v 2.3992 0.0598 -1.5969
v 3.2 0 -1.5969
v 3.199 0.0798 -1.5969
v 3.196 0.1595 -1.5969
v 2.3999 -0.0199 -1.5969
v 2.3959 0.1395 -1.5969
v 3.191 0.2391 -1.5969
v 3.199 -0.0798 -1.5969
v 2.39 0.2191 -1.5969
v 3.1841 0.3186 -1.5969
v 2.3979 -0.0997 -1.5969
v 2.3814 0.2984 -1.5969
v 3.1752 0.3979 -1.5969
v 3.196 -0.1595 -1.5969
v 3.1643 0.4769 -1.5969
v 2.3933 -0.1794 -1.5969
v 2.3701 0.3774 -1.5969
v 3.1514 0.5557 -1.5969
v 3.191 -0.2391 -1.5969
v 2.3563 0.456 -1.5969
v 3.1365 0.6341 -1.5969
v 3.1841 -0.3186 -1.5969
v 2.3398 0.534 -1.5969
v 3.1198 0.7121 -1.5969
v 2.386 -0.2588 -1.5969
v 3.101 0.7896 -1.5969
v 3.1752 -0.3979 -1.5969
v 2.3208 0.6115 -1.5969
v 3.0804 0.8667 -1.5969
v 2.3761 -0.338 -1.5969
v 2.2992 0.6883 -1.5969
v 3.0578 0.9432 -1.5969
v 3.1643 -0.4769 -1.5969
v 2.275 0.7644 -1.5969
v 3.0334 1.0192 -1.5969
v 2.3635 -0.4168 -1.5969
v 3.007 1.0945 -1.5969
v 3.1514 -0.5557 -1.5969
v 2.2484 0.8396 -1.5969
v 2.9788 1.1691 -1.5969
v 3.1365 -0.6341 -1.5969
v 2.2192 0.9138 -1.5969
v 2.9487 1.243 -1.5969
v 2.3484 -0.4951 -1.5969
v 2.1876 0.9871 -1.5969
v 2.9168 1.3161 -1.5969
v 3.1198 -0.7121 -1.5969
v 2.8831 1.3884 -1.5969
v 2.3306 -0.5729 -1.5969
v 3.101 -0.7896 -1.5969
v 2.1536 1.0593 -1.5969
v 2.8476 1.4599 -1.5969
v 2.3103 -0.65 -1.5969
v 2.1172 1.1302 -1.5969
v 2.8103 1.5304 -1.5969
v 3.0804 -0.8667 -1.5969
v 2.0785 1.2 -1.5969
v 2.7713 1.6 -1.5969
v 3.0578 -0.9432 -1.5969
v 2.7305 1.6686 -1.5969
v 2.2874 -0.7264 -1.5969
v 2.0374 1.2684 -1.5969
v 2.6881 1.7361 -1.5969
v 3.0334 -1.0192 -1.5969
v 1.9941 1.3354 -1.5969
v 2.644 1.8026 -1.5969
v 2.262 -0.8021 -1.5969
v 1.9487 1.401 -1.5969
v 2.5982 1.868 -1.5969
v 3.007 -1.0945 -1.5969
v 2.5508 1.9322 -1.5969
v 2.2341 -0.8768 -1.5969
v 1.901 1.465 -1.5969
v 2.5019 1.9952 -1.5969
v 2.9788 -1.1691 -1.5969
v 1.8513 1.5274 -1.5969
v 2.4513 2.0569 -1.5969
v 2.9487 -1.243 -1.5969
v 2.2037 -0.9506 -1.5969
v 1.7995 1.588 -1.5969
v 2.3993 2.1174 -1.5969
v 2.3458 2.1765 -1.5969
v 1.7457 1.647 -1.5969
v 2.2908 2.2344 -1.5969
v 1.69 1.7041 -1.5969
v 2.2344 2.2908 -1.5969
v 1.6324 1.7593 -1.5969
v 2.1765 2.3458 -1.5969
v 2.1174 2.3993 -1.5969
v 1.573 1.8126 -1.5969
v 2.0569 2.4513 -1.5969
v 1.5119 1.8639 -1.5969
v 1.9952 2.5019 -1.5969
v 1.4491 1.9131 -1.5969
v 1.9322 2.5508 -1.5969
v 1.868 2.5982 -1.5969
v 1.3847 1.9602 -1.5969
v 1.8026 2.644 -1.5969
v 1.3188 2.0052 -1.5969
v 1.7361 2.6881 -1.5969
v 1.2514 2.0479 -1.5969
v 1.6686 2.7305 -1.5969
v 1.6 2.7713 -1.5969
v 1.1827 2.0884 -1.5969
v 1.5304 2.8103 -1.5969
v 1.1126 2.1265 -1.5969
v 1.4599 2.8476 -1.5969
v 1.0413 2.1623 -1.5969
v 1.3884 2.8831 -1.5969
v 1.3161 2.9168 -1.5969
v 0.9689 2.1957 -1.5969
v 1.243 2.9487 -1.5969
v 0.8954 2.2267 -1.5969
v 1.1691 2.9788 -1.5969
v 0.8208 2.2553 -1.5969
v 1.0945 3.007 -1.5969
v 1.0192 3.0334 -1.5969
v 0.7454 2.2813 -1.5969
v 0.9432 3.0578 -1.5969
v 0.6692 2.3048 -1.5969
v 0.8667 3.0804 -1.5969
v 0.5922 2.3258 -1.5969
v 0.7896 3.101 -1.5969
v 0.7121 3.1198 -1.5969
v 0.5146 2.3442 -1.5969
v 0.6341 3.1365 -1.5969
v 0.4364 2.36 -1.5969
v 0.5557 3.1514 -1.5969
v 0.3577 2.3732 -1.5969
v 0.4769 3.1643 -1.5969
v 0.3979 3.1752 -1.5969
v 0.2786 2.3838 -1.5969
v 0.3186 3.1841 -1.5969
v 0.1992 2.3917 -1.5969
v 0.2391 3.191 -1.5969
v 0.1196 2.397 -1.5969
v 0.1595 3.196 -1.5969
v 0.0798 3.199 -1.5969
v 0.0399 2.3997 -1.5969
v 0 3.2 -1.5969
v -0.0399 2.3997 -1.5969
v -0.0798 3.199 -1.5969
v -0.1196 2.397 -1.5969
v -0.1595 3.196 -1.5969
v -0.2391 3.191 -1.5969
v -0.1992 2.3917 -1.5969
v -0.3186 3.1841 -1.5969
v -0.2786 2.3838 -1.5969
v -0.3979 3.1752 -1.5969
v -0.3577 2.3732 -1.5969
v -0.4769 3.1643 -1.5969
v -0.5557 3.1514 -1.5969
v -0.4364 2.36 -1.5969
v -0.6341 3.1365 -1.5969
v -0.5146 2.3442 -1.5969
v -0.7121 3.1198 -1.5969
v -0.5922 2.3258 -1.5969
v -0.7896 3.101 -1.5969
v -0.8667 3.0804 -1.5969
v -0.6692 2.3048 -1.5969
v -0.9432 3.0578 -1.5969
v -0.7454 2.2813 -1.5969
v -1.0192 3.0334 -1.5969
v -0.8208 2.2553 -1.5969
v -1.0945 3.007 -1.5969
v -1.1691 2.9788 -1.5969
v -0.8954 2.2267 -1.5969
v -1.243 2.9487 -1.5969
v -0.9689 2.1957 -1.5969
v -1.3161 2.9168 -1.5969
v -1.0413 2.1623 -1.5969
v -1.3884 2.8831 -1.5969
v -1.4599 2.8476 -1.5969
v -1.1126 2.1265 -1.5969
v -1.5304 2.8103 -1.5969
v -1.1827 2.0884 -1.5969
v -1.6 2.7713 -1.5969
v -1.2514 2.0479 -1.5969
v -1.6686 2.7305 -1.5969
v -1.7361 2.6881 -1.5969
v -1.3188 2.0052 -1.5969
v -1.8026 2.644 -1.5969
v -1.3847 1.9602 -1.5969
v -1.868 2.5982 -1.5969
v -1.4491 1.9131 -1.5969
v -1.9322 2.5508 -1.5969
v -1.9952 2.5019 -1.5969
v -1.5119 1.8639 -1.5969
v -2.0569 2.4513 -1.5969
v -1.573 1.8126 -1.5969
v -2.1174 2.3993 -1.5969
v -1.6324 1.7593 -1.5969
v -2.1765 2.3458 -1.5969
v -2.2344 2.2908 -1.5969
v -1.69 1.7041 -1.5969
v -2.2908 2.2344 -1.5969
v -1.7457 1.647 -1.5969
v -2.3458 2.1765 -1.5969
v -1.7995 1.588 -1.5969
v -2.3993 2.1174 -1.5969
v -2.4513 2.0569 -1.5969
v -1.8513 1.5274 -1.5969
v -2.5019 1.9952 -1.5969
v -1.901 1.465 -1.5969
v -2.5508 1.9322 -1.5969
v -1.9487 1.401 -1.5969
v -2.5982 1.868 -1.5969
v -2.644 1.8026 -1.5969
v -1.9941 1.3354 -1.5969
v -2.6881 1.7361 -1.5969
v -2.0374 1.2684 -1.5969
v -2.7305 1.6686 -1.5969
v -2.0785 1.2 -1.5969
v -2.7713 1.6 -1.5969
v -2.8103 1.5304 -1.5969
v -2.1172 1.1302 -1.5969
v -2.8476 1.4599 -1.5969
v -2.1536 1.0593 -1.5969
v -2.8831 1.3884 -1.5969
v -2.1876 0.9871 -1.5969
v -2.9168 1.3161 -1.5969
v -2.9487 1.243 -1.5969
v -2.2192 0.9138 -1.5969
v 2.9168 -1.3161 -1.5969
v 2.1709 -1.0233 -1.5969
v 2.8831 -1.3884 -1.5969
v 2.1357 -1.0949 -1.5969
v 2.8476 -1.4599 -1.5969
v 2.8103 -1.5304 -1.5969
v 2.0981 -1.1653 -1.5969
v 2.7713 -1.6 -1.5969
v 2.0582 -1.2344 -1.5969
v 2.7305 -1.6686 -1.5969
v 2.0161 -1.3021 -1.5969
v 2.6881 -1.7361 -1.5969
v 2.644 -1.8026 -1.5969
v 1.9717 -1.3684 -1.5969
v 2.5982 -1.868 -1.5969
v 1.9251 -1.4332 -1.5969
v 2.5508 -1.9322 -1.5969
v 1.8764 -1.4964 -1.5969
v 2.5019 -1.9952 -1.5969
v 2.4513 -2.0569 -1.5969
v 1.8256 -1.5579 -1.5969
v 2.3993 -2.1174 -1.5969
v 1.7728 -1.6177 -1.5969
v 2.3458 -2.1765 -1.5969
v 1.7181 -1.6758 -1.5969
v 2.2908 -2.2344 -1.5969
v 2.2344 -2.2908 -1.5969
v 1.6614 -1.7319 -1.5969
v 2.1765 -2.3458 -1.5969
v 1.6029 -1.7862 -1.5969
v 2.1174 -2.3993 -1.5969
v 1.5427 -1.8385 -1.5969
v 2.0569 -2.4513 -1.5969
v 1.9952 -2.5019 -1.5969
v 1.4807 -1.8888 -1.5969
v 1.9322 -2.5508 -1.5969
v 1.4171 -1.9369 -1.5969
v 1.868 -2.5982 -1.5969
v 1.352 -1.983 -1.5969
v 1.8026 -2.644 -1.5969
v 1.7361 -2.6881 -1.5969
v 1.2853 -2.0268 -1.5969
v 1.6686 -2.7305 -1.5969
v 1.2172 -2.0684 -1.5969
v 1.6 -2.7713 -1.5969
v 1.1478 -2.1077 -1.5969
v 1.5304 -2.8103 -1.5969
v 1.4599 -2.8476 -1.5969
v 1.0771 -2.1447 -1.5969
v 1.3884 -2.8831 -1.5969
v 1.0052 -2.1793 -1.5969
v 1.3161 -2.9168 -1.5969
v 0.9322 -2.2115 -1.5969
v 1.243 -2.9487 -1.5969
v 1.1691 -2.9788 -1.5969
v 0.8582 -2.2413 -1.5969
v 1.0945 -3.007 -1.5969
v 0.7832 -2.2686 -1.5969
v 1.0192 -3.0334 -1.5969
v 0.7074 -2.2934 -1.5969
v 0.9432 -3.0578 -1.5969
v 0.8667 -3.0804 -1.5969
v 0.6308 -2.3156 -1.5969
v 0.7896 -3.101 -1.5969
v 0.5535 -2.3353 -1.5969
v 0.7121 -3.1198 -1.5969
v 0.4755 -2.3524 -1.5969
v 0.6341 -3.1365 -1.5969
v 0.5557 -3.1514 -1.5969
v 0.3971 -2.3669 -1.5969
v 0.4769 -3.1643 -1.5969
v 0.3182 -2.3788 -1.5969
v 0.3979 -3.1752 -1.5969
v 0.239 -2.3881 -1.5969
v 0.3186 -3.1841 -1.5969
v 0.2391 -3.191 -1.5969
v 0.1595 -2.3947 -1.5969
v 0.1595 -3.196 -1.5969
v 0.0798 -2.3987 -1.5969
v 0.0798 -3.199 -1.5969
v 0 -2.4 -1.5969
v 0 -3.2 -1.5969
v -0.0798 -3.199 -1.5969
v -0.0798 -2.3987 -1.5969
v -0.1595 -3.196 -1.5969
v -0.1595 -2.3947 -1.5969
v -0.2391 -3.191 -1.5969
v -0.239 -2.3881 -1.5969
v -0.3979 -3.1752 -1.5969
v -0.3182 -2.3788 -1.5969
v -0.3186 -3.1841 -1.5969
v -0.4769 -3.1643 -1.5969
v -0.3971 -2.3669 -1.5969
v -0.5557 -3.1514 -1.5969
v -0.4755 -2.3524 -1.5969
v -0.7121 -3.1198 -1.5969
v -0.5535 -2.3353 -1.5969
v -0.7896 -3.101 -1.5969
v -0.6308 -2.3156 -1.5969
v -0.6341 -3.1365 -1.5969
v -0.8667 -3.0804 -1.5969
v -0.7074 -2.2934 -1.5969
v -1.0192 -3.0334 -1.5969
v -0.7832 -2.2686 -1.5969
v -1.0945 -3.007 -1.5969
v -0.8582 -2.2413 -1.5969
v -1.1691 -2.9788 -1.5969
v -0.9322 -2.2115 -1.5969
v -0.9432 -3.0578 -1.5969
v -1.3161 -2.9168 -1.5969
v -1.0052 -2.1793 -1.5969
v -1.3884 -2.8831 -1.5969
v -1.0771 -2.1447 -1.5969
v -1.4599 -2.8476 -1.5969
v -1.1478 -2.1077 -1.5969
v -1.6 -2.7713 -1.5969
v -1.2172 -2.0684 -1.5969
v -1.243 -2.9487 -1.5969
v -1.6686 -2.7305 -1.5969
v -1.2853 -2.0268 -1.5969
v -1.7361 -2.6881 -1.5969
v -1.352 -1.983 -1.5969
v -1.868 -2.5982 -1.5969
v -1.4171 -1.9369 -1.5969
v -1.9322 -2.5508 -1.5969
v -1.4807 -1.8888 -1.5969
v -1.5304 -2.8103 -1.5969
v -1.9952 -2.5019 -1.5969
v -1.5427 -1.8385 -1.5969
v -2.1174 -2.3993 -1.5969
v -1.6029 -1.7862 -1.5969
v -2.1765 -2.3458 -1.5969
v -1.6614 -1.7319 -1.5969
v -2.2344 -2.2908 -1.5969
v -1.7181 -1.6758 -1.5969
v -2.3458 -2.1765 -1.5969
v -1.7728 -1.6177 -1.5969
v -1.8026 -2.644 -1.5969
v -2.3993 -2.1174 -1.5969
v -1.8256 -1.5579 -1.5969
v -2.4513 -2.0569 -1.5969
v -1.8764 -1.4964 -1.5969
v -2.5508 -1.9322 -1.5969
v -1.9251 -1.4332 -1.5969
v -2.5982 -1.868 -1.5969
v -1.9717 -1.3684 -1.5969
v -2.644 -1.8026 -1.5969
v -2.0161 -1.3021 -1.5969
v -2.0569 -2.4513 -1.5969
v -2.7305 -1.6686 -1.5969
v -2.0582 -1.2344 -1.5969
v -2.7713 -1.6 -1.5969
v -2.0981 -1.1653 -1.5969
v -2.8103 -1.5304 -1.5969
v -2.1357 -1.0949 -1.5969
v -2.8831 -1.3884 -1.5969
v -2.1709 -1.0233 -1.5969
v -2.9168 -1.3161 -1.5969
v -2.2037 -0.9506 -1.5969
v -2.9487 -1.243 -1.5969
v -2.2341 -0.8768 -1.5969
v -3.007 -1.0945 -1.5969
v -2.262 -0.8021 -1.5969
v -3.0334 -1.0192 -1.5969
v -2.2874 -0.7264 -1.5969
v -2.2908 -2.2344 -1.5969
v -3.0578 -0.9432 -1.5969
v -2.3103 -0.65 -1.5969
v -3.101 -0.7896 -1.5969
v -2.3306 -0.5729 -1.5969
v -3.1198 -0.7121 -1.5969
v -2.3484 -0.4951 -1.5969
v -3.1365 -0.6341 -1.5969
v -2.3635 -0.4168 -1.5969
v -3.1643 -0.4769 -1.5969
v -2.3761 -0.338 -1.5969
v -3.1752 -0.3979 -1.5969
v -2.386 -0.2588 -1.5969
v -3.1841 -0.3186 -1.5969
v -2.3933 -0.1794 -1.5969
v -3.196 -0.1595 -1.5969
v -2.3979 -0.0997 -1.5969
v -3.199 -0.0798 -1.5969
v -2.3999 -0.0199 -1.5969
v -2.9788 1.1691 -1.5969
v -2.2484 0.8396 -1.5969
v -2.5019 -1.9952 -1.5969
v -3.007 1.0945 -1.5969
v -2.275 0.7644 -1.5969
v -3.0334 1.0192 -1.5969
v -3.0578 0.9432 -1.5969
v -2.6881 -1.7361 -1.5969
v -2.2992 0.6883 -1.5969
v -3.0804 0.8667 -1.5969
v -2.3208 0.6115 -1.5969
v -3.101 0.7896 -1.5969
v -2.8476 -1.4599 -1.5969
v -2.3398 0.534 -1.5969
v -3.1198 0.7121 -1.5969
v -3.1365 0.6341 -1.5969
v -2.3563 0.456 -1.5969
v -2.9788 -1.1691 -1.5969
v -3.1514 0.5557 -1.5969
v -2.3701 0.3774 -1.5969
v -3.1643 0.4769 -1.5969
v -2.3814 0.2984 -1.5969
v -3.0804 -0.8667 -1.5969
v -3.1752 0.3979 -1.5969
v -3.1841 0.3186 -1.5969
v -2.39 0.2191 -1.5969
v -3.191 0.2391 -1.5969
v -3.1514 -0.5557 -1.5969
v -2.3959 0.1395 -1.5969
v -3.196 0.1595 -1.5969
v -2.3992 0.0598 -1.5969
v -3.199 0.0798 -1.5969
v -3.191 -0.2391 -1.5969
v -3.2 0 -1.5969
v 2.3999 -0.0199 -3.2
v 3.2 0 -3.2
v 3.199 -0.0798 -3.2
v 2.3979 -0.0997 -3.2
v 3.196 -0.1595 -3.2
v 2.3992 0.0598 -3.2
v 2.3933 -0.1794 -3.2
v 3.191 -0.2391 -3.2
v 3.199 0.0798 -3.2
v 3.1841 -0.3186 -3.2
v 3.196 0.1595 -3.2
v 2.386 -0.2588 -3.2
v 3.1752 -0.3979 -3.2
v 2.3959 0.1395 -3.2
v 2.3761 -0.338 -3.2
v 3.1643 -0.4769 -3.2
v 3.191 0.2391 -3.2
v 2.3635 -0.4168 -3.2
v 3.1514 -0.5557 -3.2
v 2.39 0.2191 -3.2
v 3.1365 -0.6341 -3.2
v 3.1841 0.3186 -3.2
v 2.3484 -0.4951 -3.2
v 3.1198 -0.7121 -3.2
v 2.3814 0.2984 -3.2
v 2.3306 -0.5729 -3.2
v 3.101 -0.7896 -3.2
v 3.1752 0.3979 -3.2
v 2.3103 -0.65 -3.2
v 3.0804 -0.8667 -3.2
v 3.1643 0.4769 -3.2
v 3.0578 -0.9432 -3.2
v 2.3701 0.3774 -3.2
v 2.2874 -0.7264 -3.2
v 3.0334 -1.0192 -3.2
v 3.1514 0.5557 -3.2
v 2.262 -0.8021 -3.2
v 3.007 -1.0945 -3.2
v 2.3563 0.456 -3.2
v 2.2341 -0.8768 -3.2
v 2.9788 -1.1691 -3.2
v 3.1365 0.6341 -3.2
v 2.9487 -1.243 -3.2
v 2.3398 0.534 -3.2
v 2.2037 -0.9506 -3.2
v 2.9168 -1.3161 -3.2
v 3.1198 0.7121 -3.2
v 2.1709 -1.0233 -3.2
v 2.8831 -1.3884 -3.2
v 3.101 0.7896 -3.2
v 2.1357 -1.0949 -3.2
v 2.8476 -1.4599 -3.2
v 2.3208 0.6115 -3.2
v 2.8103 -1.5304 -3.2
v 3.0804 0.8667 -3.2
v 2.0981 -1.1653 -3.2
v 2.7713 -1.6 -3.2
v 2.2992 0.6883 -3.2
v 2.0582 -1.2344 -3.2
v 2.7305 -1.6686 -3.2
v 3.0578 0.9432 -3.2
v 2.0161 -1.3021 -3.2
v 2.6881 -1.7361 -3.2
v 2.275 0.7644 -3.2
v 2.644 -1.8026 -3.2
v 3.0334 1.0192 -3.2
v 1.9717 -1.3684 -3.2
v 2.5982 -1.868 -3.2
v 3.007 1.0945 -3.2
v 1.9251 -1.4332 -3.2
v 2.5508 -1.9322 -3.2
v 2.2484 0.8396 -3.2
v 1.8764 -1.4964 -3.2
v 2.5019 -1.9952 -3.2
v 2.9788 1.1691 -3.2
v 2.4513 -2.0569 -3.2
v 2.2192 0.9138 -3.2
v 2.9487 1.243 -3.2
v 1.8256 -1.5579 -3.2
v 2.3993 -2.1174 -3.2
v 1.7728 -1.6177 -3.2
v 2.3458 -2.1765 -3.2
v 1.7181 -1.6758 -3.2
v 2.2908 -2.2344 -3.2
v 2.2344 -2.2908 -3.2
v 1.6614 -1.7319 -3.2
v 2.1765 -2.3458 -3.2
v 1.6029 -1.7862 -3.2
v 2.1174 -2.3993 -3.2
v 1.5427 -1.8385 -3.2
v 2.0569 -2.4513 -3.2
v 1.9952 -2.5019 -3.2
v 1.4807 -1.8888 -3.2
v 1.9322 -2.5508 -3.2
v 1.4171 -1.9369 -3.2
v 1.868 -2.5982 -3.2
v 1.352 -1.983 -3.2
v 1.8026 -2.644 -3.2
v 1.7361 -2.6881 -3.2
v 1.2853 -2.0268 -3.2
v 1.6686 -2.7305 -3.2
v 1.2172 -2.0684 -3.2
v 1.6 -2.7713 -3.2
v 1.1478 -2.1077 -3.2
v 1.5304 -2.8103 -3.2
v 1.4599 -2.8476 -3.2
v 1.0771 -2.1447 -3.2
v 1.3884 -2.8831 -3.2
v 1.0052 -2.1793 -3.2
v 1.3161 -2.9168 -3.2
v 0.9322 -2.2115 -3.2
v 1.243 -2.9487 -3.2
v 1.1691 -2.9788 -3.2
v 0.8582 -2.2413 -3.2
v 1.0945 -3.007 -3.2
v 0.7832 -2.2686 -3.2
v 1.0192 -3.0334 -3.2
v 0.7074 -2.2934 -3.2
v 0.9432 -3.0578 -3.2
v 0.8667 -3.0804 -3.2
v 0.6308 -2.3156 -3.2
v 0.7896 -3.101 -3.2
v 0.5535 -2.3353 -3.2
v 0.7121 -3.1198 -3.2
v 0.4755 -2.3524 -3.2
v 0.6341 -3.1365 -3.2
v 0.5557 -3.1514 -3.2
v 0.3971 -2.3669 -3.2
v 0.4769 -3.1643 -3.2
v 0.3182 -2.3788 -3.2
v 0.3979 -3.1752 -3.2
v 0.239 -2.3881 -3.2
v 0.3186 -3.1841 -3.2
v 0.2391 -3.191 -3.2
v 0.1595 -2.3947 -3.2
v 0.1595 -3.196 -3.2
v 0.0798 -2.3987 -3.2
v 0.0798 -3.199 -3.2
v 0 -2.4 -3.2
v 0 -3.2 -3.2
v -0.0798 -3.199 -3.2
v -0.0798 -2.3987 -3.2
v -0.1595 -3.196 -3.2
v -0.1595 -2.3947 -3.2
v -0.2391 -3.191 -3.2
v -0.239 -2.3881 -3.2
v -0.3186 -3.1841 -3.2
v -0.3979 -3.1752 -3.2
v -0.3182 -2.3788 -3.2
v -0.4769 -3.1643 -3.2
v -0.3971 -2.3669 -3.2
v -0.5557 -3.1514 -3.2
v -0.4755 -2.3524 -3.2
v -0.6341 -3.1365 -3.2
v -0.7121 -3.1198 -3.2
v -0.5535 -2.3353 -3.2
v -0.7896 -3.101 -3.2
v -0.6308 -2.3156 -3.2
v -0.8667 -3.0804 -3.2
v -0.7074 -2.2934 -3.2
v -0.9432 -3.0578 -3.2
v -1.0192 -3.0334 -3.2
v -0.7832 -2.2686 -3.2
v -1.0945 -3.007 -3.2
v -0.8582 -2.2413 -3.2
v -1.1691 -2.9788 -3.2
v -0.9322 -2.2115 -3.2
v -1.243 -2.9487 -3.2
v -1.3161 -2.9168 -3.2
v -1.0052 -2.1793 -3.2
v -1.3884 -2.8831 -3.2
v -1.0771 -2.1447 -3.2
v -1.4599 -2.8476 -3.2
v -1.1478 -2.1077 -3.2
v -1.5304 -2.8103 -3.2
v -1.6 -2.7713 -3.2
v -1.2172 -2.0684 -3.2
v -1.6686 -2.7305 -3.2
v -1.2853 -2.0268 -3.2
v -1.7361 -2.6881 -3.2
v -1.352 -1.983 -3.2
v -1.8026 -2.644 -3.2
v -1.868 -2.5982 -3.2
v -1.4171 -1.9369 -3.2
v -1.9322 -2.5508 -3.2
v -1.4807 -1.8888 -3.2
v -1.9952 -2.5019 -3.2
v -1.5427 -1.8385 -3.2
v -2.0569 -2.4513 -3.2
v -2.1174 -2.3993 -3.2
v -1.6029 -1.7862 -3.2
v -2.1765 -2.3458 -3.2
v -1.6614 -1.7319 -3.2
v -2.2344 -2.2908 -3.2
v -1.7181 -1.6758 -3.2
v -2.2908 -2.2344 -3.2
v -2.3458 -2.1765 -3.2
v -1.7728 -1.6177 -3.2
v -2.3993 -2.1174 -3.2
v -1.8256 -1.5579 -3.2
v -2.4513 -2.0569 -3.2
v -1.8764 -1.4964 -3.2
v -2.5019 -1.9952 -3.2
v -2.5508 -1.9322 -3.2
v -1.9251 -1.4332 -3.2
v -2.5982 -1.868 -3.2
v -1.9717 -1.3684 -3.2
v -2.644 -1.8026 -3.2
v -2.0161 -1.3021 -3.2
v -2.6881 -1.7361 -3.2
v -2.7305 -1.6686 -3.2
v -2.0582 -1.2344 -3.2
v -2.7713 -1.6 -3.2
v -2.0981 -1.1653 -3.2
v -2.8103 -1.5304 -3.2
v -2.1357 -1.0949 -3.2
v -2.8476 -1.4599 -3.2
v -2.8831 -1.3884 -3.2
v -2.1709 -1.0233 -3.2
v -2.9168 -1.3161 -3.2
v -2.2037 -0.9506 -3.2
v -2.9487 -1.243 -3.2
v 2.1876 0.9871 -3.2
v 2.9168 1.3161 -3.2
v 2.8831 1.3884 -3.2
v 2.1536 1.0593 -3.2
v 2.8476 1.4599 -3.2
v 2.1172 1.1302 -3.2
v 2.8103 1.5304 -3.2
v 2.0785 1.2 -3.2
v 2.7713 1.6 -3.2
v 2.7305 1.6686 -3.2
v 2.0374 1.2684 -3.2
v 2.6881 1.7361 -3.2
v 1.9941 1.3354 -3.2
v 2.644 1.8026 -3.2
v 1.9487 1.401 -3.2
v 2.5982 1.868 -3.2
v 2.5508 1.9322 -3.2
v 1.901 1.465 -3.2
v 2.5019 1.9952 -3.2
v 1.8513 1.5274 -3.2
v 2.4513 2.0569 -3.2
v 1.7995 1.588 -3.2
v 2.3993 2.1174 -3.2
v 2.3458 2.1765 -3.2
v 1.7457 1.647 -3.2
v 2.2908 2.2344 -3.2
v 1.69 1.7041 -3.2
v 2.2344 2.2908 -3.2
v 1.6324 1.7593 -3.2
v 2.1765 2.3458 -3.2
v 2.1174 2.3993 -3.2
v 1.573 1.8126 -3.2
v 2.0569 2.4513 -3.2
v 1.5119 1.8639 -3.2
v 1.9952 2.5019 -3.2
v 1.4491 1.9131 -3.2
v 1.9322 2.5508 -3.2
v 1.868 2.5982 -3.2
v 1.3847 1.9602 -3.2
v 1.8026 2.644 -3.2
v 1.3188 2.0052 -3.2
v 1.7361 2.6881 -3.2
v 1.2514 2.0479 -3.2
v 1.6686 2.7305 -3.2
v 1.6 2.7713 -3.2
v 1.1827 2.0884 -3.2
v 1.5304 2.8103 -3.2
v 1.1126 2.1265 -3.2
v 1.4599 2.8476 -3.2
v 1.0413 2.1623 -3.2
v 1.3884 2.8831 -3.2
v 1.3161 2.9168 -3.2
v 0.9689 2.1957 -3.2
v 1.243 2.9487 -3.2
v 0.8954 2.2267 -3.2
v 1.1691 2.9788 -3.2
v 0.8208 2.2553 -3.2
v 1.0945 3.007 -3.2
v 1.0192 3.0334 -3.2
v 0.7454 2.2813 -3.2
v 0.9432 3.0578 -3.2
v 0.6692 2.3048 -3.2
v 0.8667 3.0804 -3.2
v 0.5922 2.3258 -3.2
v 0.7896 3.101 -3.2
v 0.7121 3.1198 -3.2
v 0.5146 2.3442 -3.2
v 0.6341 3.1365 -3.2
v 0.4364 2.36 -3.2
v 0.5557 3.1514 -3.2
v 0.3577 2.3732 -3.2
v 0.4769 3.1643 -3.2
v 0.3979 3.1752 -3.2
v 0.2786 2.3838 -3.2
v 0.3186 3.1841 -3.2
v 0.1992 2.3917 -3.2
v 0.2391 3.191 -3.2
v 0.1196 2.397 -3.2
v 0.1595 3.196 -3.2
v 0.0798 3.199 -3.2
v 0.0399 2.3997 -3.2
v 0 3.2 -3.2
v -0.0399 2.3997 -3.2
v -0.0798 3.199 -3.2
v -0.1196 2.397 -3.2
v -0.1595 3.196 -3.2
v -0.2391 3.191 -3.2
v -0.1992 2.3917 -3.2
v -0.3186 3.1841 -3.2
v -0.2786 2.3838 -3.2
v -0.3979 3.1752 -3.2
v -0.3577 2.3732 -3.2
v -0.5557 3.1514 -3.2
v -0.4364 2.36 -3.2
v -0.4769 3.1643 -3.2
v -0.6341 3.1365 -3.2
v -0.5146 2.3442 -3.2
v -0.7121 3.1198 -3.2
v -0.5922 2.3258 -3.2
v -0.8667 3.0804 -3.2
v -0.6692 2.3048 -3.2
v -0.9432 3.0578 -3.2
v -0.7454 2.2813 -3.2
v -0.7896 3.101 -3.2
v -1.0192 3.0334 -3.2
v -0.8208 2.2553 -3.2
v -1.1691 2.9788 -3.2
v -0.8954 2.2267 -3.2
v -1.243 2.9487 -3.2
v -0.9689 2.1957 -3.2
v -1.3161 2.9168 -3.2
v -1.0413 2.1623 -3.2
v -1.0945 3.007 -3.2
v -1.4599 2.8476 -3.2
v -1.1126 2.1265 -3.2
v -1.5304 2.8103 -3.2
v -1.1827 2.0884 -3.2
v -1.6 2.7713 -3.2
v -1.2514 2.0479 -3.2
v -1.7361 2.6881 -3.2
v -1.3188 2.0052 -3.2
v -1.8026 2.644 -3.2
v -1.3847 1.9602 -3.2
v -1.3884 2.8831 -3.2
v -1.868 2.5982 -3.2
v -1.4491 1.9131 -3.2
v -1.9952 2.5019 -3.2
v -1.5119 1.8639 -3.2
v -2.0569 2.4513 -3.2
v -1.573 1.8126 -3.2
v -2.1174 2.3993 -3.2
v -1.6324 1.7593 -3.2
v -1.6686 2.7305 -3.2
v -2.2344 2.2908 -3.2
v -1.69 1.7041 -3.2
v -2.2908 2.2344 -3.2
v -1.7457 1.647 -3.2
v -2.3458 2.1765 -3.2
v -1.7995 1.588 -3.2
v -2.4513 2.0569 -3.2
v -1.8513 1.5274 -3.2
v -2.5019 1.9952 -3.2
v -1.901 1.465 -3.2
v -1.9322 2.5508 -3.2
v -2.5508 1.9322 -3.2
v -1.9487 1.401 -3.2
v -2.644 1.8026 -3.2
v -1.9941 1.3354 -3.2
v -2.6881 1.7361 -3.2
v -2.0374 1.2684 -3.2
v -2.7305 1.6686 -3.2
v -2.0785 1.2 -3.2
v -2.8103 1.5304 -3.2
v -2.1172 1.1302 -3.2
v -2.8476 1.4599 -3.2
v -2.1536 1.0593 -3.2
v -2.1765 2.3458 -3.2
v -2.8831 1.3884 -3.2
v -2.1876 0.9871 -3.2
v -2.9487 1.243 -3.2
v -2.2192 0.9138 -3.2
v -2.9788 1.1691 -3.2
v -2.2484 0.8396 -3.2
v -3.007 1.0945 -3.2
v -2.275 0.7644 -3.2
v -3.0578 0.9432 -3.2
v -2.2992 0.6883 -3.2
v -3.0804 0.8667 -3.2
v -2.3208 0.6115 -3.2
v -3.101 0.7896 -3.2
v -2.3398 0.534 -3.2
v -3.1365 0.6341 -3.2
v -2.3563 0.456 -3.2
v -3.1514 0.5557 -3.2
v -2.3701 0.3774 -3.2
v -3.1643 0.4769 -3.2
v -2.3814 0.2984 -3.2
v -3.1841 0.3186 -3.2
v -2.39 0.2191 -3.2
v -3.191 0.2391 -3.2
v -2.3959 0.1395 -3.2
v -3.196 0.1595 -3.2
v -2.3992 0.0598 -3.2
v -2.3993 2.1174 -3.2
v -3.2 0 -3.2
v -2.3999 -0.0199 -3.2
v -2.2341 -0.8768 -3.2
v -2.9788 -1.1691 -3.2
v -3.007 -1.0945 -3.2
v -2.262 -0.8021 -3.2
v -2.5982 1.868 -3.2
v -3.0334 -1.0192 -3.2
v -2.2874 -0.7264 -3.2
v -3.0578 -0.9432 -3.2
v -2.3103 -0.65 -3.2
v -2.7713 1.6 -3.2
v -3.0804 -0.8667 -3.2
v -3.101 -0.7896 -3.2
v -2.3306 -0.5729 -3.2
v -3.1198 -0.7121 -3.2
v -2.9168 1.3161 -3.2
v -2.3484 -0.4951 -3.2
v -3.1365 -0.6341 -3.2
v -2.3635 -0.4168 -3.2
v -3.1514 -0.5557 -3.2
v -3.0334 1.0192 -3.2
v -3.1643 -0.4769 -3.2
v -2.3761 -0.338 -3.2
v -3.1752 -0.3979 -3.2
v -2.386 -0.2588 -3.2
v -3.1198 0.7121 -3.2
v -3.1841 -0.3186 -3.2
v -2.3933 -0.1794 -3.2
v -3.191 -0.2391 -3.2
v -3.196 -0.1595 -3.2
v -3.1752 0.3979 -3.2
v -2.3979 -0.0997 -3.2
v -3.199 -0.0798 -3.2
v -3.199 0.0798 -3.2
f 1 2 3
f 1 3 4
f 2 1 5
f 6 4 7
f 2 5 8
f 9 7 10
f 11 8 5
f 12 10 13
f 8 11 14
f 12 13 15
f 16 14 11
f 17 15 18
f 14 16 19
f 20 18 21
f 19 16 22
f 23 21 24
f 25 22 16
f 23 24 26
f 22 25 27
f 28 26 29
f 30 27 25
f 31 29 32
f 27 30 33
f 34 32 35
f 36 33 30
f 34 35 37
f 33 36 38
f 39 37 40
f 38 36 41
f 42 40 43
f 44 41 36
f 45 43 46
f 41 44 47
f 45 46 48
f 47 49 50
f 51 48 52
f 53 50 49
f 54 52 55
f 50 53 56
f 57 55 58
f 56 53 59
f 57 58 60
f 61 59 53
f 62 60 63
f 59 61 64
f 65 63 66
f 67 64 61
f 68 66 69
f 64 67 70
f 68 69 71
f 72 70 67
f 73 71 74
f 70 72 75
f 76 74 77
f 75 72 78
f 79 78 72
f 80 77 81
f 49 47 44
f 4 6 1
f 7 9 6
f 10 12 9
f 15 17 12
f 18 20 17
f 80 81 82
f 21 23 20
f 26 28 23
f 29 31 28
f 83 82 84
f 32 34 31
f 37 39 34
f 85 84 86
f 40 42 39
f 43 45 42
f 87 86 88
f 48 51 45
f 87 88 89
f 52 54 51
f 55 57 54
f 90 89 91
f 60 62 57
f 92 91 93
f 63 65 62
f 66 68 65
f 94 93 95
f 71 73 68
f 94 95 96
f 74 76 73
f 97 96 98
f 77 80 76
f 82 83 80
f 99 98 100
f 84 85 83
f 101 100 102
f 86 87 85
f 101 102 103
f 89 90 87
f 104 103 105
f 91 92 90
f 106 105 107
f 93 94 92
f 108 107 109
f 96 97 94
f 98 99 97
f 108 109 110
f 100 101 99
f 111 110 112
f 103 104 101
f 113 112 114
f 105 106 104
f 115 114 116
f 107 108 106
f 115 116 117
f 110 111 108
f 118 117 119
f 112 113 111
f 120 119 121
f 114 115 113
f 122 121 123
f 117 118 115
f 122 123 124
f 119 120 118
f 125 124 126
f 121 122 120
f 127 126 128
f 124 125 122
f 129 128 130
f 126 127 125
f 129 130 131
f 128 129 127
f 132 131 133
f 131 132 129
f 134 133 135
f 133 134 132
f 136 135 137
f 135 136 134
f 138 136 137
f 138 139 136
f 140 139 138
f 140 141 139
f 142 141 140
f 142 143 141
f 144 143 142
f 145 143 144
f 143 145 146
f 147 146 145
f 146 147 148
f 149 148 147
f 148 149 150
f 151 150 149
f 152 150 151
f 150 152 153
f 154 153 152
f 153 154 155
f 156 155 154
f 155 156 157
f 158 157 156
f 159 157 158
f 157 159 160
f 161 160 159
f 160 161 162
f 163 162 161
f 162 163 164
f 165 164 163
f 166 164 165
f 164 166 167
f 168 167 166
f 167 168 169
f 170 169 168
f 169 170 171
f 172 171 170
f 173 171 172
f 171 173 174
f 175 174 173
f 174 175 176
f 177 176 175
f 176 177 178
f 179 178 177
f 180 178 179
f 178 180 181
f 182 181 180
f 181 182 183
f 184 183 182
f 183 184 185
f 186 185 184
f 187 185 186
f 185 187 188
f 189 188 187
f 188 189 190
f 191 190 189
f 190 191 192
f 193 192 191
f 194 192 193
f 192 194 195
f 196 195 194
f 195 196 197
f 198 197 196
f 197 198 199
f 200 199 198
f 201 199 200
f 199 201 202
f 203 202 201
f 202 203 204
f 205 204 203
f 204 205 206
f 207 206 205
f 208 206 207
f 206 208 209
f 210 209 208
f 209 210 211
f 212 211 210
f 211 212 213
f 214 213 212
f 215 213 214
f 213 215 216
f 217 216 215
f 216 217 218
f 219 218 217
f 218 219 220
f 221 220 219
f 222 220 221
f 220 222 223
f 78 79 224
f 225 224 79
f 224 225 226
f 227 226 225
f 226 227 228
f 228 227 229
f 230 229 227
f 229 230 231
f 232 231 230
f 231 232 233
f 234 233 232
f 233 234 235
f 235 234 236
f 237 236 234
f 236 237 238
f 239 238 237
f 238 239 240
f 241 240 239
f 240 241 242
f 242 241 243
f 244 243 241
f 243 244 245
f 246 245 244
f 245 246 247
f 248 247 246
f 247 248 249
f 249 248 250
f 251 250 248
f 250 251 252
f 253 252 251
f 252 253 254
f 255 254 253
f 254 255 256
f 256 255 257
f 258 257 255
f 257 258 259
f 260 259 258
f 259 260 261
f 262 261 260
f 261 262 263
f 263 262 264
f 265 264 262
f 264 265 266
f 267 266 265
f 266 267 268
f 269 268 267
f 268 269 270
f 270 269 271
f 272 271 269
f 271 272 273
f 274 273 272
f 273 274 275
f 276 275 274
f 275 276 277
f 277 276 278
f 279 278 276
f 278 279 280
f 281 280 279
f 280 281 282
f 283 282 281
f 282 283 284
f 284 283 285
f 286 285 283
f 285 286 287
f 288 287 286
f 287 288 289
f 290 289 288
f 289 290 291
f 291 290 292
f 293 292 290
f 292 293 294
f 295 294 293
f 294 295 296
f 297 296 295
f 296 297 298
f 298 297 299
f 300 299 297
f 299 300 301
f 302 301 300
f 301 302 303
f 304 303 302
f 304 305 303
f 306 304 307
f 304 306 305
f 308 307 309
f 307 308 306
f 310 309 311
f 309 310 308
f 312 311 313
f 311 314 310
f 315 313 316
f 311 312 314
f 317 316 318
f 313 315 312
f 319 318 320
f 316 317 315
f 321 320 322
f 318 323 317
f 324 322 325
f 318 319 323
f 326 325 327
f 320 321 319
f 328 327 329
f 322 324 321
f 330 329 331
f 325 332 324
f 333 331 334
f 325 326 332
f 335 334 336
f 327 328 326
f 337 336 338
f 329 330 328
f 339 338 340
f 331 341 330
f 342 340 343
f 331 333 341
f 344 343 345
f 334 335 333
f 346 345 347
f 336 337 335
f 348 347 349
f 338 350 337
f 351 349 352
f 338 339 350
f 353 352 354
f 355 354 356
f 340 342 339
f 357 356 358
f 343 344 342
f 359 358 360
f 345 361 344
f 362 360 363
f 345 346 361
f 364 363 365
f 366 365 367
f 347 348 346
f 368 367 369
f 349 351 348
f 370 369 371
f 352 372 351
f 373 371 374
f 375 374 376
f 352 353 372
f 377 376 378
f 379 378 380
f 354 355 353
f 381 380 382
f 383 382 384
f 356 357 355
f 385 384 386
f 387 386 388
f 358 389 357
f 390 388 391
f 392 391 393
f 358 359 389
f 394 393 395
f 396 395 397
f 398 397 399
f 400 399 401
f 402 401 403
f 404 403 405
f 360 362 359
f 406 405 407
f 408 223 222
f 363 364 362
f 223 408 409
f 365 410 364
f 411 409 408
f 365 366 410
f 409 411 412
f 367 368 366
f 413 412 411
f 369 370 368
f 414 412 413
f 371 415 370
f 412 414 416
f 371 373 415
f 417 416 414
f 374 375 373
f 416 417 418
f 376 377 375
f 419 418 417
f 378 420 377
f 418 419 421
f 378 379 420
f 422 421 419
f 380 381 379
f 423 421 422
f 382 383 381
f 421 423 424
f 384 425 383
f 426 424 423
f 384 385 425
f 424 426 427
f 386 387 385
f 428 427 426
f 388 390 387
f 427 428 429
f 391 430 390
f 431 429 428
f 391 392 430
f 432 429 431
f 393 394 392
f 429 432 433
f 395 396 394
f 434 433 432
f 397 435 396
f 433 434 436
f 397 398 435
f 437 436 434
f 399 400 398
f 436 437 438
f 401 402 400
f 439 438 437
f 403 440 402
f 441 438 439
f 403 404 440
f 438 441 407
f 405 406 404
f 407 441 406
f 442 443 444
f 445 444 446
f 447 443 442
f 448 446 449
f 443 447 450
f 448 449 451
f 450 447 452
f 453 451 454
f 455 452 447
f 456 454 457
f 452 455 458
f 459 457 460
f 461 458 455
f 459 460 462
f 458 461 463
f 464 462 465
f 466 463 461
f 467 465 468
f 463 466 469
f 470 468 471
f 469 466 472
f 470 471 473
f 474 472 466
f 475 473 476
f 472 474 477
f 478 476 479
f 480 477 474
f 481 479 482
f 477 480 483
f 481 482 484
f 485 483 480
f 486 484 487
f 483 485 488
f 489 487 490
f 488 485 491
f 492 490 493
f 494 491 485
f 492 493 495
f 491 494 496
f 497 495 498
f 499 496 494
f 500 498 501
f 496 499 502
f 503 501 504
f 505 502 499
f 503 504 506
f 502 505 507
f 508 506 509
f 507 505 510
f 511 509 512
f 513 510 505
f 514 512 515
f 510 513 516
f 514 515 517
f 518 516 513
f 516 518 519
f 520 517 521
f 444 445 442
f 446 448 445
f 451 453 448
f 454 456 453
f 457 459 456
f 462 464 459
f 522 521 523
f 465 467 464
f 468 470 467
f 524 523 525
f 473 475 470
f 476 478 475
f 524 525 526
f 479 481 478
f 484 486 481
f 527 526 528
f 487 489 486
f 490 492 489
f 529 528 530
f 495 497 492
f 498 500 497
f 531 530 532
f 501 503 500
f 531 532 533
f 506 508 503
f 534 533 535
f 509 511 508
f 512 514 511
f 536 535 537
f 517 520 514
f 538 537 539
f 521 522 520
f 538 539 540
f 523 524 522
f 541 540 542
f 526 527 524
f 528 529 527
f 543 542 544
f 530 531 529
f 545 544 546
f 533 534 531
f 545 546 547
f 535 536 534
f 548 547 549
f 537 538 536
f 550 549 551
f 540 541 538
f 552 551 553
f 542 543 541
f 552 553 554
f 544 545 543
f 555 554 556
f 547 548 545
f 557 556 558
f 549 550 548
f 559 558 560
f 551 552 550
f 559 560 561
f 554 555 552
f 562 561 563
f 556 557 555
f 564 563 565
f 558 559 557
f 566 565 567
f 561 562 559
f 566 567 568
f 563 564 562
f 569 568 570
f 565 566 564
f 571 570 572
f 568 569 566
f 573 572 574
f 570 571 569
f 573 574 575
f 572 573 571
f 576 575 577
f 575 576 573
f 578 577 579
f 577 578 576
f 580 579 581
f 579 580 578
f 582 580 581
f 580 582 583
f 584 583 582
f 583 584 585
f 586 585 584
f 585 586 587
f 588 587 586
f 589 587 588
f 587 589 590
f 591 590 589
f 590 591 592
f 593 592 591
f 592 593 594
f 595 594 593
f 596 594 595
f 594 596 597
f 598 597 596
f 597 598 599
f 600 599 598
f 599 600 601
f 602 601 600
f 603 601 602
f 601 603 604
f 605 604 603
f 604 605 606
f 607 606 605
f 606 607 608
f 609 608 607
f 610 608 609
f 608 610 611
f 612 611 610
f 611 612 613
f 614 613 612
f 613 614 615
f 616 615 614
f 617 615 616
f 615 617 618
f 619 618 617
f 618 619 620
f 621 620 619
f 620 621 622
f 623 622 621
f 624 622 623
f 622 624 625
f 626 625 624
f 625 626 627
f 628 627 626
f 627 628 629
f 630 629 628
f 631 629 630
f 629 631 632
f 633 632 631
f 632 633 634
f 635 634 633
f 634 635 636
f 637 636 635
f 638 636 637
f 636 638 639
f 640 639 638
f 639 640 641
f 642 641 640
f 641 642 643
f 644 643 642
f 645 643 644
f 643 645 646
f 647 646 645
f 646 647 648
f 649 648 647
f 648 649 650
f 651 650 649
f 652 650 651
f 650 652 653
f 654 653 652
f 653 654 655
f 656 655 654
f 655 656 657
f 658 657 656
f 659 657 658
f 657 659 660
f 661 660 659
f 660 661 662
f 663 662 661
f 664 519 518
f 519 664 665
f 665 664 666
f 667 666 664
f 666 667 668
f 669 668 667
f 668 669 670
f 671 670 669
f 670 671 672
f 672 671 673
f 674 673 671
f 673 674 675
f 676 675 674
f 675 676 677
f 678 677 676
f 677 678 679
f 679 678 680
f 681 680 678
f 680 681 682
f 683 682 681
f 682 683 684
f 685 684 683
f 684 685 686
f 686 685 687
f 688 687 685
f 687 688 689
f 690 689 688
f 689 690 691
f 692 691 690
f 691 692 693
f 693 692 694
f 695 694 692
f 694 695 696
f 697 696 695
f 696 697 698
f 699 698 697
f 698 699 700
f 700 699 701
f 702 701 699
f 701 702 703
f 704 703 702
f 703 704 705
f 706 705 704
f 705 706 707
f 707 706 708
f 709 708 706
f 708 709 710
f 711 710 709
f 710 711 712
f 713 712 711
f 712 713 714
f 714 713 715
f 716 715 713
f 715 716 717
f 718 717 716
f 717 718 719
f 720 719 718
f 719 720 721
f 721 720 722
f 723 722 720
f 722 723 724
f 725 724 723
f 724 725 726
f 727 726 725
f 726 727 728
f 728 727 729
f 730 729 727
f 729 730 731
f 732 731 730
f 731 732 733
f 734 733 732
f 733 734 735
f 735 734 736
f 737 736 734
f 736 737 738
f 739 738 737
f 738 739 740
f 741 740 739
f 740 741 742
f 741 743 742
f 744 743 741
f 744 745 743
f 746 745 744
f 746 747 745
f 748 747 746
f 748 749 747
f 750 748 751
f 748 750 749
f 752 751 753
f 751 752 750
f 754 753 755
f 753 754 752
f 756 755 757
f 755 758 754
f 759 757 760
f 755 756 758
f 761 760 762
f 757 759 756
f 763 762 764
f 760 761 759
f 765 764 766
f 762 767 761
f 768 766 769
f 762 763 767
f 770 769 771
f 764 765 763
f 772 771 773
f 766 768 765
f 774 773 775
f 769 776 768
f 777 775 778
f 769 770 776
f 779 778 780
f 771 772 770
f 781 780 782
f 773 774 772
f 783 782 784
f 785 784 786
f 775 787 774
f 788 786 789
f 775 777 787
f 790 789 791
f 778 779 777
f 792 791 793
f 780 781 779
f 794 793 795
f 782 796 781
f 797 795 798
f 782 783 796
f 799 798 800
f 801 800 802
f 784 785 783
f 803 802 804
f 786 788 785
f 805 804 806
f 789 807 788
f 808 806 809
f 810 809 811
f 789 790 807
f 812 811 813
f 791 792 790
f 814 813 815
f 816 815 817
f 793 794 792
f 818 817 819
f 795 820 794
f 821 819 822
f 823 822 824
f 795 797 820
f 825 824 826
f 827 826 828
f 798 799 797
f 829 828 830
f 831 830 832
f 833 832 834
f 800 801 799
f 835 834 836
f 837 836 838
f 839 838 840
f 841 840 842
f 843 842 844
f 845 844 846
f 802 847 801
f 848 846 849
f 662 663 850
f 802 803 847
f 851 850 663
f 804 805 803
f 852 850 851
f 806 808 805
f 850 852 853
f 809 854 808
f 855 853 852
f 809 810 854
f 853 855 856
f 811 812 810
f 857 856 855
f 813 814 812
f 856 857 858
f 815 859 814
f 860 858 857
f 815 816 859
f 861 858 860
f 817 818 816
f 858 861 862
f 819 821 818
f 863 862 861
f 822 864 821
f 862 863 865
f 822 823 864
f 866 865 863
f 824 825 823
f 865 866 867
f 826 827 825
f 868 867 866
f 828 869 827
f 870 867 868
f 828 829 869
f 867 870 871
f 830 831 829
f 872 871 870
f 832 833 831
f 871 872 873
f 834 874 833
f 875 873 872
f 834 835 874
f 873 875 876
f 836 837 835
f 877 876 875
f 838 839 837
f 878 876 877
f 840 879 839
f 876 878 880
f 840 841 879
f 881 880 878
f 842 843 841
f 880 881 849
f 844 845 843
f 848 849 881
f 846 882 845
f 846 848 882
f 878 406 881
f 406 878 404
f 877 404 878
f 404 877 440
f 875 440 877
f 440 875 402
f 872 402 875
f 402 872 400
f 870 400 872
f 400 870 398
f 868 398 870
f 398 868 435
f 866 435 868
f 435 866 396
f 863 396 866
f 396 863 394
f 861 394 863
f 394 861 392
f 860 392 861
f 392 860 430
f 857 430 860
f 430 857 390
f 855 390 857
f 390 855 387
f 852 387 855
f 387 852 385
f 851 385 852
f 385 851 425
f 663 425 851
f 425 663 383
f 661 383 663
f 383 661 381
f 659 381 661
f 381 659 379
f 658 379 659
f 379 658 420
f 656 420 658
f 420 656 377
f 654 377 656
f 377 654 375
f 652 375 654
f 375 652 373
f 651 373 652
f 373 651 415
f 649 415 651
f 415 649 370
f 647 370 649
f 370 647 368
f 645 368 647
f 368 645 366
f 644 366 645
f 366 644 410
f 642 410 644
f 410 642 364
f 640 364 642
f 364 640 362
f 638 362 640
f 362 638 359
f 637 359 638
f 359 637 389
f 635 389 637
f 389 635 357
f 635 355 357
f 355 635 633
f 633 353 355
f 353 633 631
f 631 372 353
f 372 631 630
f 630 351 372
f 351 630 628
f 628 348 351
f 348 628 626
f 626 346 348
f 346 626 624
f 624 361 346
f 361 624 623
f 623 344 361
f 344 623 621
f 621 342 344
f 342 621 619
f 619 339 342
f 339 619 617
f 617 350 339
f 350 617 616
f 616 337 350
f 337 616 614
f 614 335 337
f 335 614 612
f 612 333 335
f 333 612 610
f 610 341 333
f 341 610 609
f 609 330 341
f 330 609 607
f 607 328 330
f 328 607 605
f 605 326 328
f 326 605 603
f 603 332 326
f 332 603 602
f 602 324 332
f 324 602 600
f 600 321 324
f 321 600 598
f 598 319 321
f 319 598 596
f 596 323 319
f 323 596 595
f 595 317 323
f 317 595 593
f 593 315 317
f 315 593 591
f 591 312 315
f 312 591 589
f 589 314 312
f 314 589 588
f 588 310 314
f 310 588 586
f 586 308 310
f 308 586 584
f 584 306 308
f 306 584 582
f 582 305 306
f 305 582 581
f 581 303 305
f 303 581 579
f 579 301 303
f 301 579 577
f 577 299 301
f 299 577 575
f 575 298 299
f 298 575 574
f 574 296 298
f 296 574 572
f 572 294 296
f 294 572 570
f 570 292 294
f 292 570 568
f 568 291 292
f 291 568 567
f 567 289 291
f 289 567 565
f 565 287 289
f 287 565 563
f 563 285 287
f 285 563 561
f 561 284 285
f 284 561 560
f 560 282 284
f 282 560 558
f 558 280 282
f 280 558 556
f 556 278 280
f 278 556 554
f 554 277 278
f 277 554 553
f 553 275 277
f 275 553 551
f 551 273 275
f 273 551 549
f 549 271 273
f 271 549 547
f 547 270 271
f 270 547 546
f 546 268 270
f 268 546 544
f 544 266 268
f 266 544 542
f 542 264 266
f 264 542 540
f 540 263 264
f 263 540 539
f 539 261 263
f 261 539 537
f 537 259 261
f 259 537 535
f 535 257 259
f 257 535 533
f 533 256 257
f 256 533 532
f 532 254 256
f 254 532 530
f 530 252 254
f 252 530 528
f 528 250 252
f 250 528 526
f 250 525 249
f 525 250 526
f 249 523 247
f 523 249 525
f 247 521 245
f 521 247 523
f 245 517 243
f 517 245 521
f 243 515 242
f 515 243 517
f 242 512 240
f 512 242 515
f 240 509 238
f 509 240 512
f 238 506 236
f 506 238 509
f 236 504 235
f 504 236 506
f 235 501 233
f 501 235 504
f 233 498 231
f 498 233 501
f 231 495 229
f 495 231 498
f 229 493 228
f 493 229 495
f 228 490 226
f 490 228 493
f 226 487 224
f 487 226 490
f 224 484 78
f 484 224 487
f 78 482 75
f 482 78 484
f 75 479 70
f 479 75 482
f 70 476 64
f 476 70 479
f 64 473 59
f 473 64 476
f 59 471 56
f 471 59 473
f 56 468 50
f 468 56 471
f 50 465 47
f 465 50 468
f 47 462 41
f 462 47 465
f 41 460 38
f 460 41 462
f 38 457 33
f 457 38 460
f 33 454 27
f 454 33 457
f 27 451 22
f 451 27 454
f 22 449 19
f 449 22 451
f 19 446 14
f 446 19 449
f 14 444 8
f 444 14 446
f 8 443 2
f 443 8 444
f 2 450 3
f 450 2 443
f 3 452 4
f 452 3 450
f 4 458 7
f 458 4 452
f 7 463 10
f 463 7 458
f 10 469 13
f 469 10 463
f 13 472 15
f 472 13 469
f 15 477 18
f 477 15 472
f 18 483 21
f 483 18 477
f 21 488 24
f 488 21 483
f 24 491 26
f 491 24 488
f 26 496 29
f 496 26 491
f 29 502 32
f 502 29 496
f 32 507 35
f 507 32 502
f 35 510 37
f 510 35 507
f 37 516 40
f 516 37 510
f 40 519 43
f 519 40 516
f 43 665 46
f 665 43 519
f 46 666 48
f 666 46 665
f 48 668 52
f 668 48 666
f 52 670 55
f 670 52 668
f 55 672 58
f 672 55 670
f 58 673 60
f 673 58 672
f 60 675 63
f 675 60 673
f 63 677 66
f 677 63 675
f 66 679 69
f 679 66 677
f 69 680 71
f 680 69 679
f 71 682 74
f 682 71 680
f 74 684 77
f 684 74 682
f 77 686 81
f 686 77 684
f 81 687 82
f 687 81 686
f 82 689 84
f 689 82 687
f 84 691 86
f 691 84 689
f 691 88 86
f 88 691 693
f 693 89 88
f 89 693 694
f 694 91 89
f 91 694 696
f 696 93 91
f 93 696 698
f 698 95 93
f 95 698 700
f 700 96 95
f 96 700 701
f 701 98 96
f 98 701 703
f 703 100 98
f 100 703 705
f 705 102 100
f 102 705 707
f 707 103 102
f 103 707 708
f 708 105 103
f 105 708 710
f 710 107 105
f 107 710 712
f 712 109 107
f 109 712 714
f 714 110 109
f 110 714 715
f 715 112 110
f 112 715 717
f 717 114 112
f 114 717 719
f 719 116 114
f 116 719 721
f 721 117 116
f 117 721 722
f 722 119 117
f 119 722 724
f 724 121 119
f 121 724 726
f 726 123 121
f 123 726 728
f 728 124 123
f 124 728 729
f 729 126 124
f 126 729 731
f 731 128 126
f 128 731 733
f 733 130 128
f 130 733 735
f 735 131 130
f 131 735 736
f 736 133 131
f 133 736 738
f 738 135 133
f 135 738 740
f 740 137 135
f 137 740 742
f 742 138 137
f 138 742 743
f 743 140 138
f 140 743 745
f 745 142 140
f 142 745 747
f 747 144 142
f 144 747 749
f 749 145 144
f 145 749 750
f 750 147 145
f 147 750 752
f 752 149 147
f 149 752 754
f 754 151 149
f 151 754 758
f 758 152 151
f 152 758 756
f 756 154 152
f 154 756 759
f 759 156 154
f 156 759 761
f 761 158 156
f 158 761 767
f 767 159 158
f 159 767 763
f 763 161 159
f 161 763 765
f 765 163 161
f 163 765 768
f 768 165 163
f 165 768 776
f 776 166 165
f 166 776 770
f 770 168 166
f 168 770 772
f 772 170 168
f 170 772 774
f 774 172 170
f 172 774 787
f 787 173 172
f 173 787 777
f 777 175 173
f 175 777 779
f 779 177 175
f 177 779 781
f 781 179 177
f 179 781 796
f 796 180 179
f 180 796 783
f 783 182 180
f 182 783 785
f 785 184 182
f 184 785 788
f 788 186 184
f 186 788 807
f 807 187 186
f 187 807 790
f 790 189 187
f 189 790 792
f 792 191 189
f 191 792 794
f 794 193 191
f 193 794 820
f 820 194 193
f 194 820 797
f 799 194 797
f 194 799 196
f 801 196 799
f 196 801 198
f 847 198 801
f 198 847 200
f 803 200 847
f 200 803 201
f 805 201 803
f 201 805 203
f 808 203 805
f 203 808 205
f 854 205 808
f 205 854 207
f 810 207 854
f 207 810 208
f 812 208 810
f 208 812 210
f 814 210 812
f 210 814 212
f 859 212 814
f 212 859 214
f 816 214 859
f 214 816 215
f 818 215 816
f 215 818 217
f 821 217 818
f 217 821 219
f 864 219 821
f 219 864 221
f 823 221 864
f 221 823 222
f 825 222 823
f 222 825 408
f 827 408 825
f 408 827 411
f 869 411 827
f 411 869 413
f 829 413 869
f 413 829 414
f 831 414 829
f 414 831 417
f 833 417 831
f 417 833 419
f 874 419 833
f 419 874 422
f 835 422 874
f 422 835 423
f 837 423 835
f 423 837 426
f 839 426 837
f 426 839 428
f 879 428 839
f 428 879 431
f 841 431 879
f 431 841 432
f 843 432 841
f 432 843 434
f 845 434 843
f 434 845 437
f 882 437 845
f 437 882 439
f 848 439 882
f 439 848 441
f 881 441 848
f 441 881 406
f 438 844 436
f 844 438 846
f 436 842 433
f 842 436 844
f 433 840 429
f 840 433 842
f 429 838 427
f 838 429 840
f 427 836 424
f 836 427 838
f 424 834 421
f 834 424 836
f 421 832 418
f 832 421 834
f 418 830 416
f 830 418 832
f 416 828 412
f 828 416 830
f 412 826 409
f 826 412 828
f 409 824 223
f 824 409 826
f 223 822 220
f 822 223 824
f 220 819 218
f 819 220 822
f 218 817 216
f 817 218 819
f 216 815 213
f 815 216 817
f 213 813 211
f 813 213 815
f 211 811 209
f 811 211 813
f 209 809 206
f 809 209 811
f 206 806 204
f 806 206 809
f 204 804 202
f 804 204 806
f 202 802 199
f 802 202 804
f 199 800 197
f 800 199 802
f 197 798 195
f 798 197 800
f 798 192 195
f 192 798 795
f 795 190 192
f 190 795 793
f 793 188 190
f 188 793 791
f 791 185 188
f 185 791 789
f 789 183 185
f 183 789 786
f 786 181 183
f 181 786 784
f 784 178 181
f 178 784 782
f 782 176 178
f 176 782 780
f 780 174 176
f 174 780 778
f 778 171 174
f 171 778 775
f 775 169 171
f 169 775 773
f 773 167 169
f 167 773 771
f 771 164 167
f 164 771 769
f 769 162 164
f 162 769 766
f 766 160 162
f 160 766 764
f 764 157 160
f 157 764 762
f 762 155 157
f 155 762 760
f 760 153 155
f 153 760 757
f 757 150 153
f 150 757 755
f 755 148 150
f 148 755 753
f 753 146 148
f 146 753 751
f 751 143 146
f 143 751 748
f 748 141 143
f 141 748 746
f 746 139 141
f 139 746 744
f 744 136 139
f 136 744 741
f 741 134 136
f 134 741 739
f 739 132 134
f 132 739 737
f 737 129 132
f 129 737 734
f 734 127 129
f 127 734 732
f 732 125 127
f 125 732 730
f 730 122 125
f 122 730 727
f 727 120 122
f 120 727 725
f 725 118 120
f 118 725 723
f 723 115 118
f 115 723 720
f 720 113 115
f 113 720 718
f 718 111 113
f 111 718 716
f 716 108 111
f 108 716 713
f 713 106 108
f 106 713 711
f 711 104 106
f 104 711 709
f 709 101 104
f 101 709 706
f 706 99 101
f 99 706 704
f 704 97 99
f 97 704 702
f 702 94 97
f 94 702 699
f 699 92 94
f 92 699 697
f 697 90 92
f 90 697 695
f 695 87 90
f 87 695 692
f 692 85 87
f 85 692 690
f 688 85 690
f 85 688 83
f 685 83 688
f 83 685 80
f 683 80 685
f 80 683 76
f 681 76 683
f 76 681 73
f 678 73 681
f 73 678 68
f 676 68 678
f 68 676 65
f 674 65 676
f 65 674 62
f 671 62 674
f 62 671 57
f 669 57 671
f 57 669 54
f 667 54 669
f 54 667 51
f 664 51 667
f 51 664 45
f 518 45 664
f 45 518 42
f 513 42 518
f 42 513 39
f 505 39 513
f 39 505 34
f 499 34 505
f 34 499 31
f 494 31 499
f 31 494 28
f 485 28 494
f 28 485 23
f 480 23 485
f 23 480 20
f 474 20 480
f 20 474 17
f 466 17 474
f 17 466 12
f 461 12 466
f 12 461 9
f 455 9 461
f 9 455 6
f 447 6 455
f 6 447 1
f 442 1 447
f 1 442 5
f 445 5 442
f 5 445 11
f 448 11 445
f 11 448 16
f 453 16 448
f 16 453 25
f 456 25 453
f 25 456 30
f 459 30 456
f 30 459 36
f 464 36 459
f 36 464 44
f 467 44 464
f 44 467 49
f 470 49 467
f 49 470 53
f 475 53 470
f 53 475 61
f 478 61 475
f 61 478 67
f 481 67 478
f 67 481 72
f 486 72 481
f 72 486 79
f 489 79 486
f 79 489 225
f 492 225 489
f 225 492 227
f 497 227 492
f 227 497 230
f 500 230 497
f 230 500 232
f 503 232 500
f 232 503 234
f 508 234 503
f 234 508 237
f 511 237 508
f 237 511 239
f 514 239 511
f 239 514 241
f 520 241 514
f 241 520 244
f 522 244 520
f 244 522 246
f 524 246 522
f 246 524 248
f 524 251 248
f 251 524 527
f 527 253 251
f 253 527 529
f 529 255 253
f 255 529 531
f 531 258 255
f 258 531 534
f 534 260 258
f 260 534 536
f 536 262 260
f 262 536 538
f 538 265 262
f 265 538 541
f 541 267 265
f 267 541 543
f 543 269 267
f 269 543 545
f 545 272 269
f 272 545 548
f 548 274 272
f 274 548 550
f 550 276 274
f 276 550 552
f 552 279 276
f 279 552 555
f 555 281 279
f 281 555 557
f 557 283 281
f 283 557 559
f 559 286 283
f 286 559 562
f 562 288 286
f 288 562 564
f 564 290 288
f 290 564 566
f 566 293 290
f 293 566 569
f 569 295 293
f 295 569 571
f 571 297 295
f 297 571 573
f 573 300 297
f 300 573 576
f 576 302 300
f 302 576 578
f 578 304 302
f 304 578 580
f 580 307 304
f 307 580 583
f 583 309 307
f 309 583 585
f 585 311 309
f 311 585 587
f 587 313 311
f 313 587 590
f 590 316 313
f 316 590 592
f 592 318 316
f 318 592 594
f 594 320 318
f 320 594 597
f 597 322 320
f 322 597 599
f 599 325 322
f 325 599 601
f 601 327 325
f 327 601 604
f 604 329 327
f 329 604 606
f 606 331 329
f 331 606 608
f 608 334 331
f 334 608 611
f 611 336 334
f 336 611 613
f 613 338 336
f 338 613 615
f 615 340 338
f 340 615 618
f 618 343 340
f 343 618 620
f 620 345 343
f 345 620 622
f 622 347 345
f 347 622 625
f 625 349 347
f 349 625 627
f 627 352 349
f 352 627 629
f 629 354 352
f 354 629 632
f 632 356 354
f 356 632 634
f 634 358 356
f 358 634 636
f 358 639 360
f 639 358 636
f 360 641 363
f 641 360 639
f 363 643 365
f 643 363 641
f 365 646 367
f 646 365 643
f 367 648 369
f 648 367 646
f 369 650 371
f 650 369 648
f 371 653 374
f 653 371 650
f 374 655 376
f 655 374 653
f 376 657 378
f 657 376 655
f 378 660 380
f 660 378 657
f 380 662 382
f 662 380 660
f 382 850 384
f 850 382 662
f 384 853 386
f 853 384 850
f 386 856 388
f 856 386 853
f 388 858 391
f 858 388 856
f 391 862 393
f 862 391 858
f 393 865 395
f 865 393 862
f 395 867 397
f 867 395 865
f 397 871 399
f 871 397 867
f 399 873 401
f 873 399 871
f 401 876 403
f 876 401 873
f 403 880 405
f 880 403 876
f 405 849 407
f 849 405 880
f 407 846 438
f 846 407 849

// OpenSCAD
use <../lib.scad>
use <../p/4-4disc.scad>
use <../p/4-4ring1.scad>
use <../p/4-4ring2.scad>
use <../p/4-4ring3.scad>
use <../p/4-4ring4.scad>
use <../p/4-4ring5.scad>
use <s/14769s01.scad>
$fa=1; $fs=0.2;
function ldraw_lib__14769p09(realsolid=false) = [
// 0 Tile  2 x  2 Round with Round Underside Stud with Archery Target Pattern
// 0 Name: 14769p09.dat
// 0 Author: Evert-Jan Boer [ejboer]
// 0 !LDRAW_ORG Part UPDATE 2017-01
// 0 !LICENSE Licensed under CC BY 2.0 and CC BY 4.0 : see CAreadme.txt
// 
// 0 BFC CERTIFY CCW
  [0,"BFC","CERTIFY"],
  [0,"BFC","CCW"],
// 
// 0 !KEYWORDS Arrow, BrickLink 14769pb086
// 
// 0 !HISTORY 2017-12-30 [PTadmin] Official Update 2017-01
// 
// 
// 1 16 0 0 0 1 0 0 0 1 0 0 0 1 s\14769s01.dat
  [1,16,0,0,0,1,0,0,0,1,0,0,0,1, ldraw_lib__s__14769s01(realsolid)],
// 
// 1 14 0 0 0 3.3333 0 0 0 1 0 0 0 3.3333 4-4disc.dat
  [1,14,0,0,0,3.3333,0,0,0,1,0,0,0,3.3333, ldraw_lib__4_4disc(realsolid)],
// 1 16 0 0 0 3.3333 0 0 0 1 0 0 0 3.3333 4-4ring1.dat
  [1,16,0,0,0,3.3333,0,0,0,1,0,0,0,3.3333, ldraw_lib__4_4ring1(realsolid)],
// 1 4 0 0 0 3.3333 0 0 0 1 0 0 0 3.3333 4-4ring2.dat
  [1,4,0,0,0,3.3333,0,0,0,1,0,0,0,3.3333, ldraw_lib__4_4ring2(realsolid)],
// 1 16 0 0 0 3.3333 0 0 0 1 0 0 0 3.3333 4-4ring3.dat
  [1,16,0,0,0,3.3333,0,0,0,1,0,0,0,3.3333, ldraw_lib__4_4ring3(realsolid)],
// 1 1 0 0 0 3.3333 0 0 0 1 0 0 0 3.3333 4-4ring4.dat
  [1,1,0,0,0,3.3333,0,0,0,1,0,0,0,3.3333, ldraw_lib__4_4ring4(realsolid)],
// 1 16 0 0 0 3.3333 0 0 0 1 0 0 0 3.3333 4-4ring5.dat
  [1,16,0,0,0,3.3333,0,0,0,1,0,0,0,3.3333, ldraw_lib__4_4ring5(realsolid)],
];
module ldraw_lib__14769p09(step=0, col=false, unit=2/5, alt=false, line=0.2, solid=!$preview)
    makepoly(ldraw_lib__14769p09(solid), step=step, col=col, unit=unit, alt=alt, line=line, solid=solid);
ldraw_lib__14769p09(line=0.2);
